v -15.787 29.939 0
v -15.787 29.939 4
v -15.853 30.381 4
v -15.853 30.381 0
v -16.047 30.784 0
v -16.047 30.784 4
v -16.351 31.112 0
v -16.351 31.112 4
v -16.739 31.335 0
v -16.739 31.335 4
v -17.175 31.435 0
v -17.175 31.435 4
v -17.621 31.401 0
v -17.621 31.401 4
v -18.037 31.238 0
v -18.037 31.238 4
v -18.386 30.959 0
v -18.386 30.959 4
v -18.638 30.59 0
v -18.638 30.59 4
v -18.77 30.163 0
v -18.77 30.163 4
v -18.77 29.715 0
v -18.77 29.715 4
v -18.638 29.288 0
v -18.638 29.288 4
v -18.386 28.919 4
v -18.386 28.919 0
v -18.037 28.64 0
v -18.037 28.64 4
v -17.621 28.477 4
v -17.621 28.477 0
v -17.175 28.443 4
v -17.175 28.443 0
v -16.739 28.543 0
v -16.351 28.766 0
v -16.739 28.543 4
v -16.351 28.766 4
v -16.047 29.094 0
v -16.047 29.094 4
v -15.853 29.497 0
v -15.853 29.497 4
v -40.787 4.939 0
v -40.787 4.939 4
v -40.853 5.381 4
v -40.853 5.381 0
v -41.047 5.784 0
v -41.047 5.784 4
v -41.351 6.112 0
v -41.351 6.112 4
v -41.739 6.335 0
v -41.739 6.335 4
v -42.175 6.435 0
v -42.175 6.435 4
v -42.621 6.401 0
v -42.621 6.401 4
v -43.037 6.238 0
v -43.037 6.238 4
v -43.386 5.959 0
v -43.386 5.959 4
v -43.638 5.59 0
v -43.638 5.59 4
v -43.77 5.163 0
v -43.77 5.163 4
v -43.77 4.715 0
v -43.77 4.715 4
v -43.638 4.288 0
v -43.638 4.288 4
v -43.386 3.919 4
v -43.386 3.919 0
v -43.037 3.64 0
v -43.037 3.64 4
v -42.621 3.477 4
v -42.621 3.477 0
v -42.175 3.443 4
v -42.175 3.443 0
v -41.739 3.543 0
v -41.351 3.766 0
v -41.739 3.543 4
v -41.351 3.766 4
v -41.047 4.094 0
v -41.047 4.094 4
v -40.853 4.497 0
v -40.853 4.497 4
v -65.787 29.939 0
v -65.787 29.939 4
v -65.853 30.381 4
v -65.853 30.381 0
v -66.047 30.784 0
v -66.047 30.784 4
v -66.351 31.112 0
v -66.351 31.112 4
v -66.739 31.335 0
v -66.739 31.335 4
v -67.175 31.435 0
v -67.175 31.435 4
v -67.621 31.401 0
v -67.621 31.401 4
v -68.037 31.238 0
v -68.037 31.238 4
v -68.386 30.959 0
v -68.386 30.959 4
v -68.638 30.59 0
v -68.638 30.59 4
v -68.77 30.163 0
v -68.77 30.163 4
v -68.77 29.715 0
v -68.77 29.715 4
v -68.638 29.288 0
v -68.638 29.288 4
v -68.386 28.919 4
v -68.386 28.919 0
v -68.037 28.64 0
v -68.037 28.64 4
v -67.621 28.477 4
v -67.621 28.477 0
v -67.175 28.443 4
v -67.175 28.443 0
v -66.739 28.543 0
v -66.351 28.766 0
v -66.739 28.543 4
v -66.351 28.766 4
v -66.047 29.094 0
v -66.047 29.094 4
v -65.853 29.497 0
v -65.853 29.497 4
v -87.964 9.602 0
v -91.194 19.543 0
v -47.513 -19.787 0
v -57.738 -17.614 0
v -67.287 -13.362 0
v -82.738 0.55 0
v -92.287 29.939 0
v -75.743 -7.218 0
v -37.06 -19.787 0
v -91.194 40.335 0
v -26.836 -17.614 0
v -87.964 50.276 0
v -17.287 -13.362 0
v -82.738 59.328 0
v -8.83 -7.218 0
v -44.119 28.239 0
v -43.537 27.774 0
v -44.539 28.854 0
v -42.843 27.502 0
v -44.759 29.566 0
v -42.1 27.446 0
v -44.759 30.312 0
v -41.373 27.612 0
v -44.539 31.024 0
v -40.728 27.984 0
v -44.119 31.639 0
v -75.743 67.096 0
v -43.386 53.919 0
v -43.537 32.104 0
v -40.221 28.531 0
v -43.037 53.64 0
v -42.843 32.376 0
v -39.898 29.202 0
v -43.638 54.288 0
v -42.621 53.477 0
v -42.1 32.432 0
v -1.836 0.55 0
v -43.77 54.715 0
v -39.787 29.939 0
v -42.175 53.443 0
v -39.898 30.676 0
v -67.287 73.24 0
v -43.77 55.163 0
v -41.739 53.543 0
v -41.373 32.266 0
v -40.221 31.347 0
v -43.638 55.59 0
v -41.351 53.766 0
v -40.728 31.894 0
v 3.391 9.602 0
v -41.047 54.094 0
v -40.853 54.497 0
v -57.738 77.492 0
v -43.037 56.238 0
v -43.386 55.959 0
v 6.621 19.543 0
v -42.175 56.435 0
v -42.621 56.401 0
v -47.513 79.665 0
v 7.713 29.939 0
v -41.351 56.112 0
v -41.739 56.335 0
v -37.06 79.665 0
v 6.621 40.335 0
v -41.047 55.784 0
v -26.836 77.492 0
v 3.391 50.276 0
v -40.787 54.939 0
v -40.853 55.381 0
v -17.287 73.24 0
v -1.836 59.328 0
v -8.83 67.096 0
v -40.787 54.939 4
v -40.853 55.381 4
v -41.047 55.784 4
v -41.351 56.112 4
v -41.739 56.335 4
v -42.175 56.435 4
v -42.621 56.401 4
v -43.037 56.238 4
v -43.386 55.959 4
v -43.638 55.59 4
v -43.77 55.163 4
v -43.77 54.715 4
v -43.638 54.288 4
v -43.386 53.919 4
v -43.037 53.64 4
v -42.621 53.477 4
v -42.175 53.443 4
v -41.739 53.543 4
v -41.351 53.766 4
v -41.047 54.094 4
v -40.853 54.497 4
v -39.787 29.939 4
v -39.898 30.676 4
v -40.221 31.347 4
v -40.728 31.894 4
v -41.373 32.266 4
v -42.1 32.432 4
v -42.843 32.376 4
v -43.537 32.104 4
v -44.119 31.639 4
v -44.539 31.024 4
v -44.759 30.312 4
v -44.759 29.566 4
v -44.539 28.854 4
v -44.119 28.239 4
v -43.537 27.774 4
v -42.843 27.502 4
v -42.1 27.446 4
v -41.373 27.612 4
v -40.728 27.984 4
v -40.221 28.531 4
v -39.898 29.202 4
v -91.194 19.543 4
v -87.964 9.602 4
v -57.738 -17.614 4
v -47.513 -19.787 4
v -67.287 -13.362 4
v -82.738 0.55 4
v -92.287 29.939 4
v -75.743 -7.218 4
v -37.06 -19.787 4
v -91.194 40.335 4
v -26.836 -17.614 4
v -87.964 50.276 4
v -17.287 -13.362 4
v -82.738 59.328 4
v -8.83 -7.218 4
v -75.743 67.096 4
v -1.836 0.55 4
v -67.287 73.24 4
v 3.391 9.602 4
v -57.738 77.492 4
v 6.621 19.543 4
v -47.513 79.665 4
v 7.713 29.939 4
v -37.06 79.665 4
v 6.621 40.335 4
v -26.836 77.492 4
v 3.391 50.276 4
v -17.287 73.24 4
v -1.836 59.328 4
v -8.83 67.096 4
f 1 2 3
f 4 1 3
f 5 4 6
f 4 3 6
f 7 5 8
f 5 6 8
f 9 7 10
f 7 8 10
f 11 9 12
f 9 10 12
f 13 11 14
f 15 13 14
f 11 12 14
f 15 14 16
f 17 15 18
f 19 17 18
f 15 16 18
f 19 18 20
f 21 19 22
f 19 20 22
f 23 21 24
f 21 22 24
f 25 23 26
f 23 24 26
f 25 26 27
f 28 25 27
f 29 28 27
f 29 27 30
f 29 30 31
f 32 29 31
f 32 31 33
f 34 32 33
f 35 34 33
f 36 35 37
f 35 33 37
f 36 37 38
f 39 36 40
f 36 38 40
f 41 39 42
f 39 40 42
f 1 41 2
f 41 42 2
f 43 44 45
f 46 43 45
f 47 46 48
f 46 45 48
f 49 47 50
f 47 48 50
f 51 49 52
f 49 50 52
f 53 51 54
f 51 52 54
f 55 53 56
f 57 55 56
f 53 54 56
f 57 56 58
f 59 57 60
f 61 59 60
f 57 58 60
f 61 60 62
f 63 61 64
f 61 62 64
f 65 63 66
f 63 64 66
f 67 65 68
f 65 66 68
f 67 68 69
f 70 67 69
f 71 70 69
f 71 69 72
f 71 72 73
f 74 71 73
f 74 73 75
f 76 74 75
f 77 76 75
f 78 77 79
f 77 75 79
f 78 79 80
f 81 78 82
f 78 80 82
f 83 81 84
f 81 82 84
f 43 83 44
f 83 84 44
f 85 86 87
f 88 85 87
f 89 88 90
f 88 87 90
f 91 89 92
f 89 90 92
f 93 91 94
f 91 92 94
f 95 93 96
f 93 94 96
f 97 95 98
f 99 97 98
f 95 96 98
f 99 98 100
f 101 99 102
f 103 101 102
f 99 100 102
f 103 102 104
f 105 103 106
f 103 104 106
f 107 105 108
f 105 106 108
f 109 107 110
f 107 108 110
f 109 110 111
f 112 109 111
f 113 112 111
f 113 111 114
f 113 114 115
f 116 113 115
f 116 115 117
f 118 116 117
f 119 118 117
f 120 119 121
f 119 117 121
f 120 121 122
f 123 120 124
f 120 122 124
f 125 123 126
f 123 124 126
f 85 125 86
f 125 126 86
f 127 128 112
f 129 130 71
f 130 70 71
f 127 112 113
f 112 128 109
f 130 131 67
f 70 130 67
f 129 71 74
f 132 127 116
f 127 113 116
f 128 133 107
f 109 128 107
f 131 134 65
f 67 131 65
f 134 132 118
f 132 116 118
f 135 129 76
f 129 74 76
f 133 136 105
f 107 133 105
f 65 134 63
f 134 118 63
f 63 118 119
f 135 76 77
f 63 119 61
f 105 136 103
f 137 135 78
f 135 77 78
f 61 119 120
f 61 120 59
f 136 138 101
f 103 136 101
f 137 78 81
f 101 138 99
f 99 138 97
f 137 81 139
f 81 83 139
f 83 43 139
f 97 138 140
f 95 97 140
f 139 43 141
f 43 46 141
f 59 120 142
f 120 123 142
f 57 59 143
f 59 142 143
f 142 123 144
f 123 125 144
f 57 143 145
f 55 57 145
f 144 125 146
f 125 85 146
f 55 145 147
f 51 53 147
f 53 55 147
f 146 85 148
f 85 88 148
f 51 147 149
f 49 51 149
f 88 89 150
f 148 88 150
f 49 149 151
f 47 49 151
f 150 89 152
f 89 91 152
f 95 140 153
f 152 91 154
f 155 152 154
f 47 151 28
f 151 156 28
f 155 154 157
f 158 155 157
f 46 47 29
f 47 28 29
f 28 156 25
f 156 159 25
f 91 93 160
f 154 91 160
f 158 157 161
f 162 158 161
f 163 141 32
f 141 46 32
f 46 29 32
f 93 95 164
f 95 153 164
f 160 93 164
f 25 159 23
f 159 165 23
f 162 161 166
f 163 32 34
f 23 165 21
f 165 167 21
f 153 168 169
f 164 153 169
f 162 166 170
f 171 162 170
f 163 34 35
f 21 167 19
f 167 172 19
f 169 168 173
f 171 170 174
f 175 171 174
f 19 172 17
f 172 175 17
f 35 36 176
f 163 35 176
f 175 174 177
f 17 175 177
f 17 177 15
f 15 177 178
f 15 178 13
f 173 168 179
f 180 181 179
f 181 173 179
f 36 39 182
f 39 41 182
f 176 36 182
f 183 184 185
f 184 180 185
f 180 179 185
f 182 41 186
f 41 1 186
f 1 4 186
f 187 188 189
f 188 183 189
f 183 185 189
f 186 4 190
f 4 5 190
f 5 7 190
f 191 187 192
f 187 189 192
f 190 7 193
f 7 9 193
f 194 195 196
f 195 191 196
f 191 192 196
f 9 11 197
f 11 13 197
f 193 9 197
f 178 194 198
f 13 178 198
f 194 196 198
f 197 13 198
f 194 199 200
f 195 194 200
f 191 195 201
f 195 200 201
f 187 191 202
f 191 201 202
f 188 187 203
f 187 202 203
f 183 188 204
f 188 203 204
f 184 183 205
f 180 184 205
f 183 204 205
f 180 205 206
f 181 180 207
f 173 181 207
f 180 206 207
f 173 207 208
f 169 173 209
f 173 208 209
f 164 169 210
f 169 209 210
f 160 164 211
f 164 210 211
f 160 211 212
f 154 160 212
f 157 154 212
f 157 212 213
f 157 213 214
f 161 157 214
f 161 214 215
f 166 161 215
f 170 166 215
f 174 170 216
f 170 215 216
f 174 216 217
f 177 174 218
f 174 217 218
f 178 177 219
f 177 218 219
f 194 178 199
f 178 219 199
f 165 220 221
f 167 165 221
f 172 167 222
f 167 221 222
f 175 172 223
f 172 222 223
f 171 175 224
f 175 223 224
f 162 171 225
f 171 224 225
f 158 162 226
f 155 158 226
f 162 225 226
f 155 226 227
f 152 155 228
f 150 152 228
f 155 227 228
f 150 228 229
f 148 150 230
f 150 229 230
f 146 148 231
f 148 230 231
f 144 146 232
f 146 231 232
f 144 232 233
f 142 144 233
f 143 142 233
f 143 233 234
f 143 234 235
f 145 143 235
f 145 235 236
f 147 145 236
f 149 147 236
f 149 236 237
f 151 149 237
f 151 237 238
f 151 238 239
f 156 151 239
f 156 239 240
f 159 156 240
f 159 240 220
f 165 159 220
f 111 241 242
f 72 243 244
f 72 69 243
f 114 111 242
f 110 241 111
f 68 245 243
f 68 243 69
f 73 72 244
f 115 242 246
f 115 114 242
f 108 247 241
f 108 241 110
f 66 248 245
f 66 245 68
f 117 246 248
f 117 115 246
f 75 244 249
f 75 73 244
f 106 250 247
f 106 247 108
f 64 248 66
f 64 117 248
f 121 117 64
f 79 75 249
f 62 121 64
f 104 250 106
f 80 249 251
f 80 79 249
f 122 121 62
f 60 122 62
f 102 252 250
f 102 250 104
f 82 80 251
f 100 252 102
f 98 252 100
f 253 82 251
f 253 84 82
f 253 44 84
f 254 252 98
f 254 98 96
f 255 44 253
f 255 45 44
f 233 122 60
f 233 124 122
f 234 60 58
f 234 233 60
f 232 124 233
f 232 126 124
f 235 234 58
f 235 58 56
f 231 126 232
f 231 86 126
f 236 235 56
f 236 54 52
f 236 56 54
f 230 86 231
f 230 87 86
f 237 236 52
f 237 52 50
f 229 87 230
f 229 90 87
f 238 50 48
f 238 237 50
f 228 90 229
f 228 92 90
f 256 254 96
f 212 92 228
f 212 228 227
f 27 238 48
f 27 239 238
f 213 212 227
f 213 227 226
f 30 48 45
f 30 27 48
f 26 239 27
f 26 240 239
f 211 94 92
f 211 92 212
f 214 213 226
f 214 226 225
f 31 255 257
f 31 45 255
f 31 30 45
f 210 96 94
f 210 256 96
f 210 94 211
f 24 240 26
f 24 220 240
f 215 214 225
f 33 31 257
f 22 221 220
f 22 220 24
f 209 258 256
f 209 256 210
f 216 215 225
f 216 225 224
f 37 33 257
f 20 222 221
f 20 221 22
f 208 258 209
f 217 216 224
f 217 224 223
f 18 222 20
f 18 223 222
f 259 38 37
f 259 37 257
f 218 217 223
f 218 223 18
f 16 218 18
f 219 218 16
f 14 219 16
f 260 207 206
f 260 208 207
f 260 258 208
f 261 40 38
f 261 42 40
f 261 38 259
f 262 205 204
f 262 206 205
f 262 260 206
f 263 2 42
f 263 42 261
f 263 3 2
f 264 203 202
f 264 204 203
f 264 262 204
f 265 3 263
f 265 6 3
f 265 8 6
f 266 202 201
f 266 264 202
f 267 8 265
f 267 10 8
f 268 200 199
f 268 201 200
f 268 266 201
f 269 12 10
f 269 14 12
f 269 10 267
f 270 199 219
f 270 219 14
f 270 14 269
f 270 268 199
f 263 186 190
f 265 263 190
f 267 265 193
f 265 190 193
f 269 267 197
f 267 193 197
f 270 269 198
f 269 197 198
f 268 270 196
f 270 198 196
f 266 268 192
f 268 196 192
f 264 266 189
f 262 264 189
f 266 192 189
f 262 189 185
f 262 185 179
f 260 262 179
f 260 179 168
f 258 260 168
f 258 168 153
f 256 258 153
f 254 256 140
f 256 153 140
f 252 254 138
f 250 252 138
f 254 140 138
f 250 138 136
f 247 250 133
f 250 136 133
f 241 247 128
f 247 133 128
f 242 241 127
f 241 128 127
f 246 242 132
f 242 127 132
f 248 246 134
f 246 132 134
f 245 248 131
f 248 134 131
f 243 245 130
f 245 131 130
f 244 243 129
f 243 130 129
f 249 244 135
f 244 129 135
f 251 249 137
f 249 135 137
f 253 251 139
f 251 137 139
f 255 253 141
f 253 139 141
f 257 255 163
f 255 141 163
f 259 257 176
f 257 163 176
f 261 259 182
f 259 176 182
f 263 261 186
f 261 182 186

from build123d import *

# Parameters (mm, degrees)
SKETCH1_R           = 50
BOSS_EXTRUDE1_DEPTH = 4
SKETCH4_R           = 2.5
CUT_EXTRUDE1_DEPTH  = 5
SKETCH5_R           = 1.5
CUT_EXTRUDE2_DEPTH  = 4


with BuildPart() as part:
    # Sketch1 → Boss-Extrude1 (new body)
    with BuildSketch(Plane.XY):
        with Locations((-42.286719292, 29.938997259)):
            Circle(SKETCH1_R)
    extrude(amount=BOSS_EXTRUDE1_DEPTH)

    # Sketch4 → Cut-Extrude1 (cut)
    with BuildSketch(Plane.XY.offset(4)):
        with Locations((-42.286719292, 29.938997259)):
            Circle(SKETCH4_R)
    extrude(amount=-CUT_EXTRUDE1_DEPTH, mode=Mode.SUBTRACT)

    # Sketch5 → Cut-Extrude2 (cut)
    with BuildSketch(Plane.XY.offset(4)):
        with Locations((-67.286719292, 29.938997259)):
            Circle(SKETCH5_R)
        with Locations((-42.286719292, 54.938997259)):
            Circle(SKETCH5_R)
        with Locations((-17.286719292, 29.938997259)):
            Circle(SKETCH5_R)
        with Locations((-42.286719292, 4.938997259)):
            Circle(SKETCH5_R)
    extrude(amount=-CUT_EXTRUDE2_DEPTH, mode=Mode.SUBTRACT)


solid = part.part
